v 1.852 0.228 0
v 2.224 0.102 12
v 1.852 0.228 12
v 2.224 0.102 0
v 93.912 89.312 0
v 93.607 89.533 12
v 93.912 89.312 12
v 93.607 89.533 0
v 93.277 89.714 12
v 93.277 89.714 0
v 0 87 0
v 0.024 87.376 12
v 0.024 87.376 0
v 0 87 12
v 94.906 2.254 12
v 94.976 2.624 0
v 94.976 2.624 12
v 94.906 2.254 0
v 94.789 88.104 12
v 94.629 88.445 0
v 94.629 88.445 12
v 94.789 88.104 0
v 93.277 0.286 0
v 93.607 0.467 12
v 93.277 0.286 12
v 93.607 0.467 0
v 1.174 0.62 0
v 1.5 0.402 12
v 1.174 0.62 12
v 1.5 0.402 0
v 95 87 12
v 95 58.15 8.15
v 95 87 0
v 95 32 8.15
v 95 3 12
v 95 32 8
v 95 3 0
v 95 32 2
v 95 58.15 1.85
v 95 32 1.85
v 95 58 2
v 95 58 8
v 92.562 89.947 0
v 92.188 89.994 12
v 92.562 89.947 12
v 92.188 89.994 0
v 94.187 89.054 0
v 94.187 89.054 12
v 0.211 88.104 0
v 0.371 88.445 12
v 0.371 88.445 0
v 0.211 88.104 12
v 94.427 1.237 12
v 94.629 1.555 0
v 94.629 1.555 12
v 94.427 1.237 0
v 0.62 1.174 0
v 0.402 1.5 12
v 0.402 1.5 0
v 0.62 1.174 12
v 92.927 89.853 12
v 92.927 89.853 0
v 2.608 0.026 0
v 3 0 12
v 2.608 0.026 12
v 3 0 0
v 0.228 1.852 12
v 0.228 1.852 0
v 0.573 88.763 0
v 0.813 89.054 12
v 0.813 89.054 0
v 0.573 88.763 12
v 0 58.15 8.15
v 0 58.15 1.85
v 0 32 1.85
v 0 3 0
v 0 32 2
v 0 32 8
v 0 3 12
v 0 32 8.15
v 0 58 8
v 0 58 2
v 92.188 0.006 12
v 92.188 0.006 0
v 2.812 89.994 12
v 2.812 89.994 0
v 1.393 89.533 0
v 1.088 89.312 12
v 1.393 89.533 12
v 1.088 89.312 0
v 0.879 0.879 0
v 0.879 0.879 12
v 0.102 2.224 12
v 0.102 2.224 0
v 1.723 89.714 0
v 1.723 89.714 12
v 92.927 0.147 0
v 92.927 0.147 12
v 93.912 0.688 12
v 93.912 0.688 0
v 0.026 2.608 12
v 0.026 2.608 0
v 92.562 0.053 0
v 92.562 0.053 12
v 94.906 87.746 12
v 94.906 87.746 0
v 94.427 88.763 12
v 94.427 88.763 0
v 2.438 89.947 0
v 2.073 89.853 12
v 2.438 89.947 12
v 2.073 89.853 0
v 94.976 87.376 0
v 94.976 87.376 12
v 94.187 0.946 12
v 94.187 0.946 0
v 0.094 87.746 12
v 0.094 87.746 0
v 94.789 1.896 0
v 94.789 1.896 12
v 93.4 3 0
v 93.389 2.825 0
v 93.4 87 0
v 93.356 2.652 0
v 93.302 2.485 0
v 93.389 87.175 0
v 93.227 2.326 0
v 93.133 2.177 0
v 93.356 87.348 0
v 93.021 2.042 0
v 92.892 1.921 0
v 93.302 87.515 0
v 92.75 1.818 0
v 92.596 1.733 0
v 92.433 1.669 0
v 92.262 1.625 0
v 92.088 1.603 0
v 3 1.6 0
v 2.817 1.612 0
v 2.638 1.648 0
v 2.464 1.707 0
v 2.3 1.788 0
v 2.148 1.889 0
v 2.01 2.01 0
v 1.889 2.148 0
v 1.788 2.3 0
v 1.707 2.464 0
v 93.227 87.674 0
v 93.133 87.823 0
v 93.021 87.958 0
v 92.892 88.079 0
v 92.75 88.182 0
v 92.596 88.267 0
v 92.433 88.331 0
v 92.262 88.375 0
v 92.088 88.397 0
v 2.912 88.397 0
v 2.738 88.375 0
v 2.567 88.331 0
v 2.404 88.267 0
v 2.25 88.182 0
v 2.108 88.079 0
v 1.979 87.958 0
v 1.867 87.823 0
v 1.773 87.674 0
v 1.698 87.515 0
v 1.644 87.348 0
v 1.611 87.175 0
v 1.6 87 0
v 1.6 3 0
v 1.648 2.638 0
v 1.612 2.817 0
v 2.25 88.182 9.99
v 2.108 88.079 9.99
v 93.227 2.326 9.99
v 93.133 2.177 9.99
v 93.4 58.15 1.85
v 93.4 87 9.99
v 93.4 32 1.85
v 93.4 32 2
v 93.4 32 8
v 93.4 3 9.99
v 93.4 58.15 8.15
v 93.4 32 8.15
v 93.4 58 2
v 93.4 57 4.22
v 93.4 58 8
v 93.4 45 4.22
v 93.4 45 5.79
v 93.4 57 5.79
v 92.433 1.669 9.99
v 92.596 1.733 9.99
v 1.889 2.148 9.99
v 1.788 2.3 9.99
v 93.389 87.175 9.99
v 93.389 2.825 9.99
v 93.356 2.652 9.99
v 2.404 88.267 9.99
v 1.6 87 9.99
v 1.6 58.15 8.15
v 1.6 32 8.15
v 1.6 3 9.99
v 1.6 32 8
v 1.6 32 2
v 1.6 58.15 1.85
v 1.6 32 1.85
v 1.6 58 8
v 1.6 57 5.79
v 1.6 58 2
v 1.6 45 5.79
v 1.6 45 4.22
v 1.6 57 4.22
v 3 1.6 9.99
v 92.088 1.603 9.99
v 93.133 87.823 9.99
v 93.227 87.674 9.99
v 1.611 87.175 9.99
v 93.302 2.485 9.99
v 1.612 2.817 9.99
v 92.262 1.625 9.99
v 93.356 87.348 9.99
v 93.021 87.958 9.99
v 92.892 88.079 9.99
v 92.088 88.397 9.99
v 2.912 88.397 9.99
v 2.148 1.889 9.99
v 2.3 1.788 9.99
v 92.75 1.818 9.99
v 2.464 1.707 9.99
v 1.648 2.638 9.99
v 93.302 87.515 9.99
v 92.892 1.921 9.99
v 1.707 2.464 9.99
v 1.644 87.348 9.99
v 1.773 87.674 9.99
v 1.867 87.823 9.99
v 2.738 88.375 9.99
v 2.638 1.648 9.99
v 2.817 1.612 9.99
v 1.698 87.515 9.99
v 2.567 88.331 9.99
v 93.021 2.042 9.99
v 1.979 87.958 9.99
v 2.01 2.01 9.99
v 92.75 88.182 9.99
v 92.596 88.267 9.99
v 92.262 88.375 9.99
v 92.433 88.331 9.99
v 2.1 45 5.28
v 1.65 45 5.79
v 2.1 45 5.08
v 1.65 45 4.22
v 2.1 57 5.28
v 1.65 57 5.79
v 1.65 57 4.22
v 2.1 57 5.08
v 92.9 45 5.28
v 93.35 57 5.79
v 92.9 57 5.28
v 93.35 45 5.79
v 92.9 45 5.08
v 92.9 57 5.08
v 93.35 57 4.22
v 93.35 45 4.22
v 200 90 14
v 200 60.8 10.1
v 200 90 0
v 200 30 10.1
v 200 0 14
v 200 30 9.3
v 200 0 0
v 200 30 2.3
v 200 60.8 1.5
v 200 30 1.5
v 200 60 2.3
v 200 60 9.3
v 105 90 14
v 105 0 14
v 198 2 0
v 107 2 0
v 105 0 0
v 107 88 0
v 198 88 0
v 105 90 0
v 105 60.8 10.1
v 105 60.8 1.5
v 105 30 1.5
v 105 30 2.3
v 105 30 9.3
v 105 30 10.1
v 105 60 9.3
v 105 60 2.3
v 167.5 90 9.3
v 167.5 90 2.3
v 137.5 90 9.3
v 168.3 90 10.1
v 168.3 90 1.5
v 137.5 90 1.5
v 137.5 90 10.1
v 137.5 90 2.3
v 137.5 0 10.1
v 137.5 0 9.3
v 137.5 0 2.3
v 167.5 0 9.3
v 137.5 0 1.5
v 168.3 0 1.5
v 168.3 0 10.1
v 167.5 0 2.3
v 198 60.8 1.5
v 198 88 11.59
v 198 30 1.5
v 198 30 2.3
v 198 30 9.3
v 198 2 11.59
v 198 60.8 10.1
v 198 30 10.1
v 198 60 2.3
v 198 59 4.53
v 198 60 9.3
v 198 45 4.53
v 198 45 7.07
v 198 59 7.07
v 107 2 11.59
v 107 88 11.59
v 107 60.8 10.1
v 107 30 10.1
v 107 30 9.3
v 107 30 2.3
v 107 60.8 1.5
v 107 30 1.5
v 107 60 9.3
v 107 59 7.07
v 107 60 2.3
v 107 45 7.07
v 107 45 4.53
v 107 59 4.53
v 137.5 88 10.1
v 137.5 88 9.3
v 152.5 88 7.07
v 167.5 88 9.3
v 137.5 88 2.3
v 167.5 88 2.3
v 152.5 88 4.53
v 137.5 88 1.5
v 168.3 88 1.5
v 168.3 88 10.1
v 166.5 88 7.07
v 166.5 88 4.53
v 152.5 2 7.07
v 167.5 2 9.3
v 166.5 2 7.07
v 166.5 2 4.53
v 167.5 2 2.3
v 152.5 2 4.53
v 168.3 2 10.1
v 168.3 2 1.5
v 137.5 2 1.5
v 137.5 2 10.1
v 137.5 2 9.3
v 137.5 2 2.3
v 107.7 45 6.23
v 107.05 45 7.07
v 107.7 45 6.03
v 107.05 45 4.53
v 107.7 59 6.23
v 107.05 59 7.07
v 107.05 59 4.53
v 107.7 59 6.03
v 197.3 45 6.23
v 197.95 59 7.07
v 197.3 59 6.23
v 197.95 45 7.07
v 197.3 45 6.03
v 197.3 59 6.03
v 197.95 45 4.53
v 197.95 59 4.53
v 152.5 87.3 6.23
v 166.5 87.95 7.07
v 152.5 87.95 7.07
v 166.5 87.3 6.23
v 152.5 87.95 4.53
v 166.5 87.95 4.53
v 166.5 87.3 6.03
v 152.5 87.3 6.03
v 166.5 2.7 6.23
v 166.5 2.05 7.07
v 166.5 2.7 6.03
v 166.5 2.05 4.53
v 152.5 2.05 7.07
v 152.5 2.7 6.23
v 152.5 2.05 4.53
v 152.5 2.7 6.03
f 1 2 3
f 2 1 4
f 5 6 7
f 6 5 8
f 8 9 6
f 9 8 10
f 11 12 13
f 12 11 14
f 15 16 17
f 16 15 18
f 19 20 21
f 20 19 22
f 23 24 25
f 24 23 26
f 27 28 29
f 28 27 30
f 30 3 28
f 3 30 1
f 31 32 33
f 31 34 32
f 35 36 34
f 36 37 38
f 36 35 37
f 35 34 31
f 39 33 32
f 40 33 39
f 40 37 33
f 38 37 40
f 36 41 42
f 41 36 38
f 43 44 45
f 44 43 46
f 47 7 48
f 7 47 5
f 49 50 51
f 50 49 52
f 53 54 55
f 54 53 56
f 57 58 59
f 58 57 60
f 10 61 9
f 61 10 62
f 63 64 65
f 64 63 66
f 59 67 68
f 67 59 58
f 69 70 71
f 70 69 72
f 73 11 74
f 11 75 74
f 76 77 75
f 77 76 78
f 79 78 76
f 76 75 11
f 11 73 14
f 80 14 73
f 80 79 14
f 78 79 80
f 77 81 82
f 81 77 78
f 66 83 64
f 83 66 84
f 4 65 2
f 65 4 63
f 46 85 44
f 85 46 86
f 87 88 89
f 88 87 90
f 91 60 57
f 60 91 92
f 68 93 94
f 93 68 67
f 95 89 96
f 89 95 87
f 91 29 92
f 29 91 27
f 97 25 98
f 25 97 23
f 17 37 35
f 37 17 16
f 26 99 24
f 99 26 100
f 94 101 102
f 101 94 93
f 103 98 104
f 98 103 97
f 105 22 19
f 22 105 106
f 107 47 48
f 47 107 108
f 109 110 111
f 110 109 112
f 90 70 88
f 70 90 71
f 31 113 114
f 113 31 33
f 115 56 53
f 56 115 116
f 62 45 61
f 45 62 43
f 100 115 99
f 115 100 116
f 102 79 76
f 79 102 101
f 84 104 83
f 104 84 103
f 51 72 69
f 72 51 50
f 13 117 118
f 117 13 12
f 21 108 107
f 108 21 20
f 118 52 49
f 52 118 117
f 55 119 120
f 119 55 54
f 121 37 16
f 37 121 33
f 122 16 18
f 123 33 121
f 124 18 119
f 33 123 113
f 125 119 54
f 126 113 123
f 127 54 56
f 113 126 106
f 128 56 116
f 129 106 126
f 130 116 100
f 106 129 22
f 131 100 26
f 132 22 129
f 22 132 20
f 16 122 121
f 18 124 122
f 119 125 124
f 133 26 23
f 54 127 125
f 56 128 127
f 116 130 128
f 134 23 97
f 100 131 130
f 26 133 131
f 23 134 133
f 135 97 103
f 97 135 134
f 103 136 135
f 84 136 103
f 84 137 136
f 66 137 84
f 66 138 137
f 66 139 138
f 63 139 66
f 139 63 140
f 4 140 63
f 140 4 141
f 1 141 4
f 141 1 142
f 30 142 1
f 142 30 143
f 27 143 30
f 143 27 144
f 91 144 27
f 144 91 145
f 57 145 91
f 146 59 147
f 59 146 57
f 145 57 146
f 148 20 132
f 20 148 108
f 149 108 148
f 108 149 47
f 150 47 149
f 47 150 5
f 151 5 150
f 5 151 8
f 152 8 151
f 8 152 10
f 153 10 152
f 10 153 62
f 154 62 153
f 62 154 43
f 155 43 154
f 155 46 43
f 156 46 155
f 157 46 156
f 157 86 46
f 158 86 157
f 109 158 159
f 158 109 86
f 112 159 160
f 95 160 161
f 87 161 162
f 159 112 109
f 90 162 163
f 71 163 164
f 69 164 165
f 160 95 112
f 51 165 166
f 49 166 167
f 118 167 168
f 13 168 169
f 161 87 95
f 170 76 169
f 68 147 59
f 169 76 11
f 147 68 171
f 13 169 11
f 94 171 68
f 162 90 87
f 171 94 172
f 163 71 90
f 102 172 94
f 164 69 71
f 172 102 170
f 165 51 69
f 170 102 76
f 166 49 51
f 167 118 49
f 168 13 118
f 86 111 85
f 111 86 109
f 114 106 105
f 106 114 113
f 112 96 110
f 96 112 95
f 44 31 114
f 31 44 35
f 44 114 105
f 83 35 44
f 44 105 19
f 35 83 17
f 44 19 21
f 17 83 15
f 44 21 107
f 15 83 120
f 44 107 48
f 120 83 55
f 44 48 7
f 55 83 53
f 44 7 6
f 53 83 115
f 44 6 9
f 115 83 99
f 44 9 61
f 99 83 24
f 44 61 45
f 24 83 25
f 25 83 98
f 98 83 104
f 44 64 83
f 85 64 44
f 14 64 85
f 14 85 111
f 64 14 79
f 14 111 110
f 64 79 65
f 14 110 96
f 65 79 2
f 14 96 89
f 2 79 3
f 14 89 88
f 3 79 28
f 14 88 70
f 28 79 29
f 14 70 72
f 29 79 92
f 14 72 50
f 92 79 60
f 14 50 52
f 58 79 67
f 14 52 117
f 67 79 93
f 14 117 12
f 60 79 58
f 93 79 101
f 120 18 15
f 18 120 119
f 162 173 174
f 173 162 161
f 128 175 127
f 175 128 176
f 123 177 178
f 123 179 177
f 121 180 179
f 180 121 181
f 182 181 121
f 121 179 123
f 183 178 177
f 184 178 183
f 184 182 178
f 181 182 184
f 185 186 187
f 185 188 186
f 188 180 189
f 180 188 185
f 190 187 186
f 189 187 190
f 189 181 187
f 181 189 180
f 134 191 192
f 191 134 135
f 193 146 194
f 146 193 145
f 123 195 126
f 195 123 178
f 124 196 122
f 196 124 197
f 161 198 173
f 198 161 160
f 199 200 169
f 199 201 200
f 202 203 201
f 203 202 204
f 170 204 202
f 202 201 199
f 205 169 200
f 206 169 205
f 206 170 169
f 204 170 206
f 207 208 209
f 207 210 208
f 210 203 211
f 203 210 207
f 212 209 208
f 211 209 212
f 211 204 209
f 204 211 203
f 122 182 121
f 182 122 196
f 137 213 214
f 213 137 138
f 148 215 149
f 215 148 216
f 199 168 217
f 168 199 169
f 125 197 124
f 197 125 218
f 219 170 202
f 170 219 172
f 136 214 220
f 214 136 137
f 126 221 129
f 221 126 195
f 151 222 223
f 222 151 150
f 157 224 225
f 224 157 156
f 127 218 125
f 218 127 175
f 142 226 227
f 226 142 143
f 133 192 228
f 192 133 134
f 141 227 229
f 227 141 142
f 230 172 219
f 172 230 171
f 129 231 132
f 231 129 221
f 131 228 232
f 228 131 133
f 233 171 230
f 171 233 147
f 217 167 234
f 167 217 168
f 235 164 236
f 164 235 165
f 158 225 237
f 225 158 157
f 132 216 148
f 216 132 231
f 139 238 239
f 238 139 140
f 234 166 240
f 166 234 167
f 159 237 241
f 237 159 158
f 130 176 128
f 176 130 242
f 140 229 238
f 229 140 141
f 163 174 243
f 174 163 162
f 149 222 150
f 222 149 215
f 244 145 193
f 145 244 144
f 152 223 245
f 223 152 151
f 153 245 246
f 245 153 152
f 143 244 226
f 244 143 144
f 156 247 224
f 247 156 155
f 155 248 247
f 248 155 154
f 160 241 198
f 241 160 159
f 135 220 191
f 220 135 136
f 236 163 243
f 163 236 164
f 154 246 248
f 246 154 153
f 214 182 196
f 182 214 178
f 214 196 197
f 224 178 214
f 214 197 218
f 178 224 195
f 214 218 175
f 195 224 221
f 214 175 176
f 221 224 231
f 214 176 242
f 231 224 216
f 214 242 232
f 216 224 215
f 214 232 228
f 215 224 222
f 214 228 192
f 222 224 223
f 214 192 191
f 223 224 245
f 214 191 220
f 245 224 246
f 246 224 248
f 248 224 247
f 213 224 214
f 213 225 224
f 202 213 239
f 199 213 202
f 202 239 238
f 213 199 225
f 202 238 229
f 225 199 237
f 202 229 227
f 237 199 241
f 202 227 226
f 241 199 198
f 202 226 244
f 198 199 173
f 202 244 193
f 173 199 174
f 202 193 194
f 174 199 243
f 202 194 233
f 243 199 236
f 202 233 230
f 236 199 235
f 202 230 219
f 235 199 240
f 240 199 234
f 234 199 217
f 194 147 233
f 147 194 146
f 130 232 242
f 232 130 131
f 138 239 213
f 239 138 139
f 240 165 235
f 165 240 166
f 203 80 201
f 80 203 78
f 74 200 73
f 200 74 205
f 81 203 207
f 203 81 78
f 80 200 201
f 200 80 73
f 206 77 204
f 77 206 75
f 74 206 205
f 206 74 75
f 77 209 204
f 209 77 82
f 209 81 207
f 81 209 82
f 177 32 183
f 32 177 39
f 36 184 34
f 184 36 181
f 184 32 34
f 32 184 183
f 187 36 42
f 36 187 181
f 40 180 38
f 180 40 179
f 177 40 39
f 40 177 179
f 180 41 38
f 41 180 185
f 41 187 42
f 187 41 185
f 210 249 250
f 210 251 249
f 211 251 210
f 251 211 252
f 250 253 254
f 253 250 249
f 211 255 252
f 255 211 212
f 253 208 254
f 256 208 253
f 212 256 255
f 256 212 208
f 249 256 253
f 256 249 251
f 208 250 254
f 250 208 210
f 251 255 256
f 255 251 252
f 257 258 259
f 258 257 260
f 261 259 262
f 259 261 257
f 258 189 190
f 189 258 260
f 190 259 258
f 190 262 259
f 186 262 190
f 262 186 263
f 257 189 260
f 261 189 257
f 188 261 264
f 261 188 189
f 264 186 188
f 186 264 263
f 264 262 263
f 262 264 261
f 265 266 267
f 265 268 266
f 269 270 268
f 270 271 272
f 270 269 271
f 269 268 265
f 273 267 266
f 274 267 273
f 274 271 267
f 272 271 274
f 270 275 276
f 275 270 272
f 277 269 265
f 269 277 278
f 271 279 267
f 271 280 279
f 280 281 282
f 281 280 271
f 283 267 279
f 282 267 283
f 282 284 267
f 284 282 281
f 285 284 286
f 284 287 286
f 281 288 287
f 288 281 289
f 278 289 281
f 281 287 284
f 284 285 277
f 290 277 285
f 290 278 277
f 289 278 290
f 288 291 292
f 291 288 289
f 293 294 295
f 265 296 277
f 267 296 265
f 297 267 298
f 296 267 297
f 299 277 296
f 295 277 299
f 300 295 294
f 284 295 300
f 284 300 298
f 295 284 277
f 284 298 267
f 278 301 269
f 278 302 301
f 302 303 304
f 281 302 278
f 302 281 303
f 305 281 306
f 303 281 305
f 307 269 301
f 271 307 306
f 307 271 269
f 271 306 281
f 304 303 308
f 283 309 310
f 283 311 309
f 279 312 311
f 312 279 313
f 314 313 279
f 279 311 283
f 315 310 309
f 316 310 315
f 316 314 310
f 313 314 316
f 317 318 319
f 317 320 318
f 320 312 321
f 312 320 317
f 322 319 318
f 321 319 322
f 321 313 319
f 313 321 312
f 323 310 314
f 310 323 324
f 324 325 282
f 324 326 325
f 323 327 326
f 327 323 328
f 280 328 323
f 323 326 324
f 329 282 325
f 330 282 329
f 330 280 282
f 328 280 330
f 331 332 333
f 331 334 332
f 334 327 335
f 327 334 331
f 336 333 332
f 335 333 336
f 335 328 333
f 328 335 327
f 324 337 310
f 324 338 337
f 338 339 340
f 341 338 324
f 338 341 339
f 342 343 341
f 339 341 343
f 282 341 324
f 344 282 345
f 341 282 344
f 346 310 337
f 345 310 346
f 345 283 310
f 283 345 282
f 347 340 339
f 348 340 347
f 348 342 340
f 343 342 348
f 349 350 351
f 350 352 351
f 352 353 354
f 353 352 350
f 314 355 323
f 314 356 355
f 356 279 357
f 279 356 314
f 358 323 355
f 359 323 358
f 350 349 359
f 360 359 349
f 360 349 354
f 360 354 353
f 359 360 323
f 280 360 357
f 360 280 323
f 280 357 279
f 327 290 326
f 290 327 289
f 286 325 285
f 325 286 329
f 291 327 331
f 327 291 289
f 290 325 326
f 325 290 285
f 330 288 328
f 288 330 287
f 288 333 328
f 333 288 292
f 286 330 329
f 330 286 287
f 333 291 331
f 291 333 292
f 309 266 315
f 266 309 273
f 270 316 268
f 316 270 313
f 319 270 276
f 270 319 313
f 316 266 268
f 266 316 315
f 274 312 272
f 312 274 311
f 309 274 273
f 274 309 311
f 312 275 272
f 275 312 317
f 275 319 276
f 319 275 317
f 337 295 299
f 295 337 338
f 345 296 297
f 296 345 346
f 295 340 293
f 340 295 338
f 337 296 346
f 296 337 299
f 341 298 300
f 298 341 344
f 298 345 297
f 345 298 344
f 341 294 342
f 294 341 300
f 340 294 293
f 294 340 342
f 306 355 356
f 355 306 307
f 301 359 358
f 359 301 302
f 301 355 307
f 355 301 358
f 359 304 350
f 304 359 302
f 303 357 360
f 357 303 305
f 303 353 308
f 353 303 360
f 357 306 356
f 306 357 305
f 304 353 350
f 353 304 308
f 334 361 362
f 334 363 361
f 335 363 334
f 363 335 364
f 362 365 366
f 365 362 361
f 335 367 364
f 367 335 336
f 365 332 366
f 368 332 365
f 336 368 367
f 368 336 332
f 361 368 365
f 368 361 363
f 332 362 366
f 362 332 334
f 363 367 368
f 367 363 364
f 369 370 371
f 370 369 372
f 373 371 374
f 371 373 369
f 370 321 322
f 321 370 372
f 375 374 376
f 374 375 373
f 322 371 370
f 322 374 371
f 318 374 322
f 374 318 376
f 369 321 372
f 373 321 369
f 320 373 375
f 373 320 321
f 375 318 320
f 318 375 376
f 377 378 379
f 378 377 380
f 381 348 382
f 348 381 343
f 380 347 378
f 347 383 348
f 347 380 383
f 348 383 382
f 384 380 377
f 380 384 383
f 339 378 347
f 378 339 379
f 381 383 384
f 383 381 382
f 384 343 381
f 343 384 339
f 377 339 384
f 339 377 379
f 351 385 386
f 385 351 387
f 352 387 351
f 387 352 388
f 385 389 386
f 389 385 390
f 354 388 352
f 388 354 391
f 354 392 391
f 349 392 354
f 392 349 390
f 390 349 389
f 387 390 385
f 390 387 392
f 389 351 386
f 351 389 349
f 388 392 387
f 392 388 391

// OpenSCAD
$fn=48;
translate([0,0,0])
{
union()
{
    difference()
    {
        translate(v = [3.00, 3.00, 0.00])
        {
            hull()
            {
                cylinder(center = false, r1 = 3, r2 = 3, h = 12);
                translate(v = [89.00, 0.00, 0.00])
                {
                    cylinder(center = false, r1 = 3, r2 = 3, h = 12, $fn = 50);
                }
                translate(v = [0.00, 84.00, 0.00])
                {
                    cylinder(center = false, r1 = 3, r2 = 3, h = 12, $fn = 50);
                }
                translate(v = [89.00, 84.00, 0.00])
                {
                    cylinder(center = false, r1 = 3, r2 = 3, h = 12, $fn = 50);
                }
            }
        }
        translate(v = [1.60, 1.60, -0.01])
        {
            translate(v = [1.40, 1.40, 0.00])
            {
                hull()
                {
                    cylinder(center = false, r1 = 1.4, r2 = 1.4, h = 10);
                    translate(v = [89.00, 0.00, 0.00])
                    {
                        cylinder(center = false, r1 = 1.4, r2 = 1.4, h = 10, $fn = 50);
                    }
                    translate(v = [0.00, 84.00, 0.00])
                    {
                        cylinder(center = false, r1 = 1.4, r2 = 1.4, h = 10, $fn = 50);
                    }
                    translate(v = [89.00, 84.00, 0.00])
                    {
                        cylinder(center = false, r1 = 1.4, r2 = 1.4, h = 10, $fn = 50);
                    }
                }
            }
        }
        translate(v = [1.60, 58.15, 0.00])
        {
            rotate([90.00, 0.00, 0.00])
            {
                translate(v = [-1.65, 8.00, 0.00])
                {
                    cube(size = [1.70, 0.15, 26.15], center = false); 
                }
            }
        }
        translate(v = [1.60, 58.15, 0.00])
        {
            rotate([90.00, 0.00, 0.00])
            {
                translate(v = [-1.65, 1.85, 0.00])
                {
                    cube(size = [1.70, 0.15, 26.15], center = false); 
                }
            }
        }
        translate(v = [1.60, 58.15, 0.00])
        {
            rotate([90.00, 0.00, 0.00])
            {
                translate(v = [-1.65, 1.85, 0.00])
                {
                    cube(size = [1.70, 6.30, 0.15], center = false); 
                }
            }
        }
        translate(v = [93.40, 32.00, 0.00])
        {
            rotate([90.00, 0.00, 180.00])
            {
                translate(v = [-1.65, 8.00, 0.00])
                {
                    cube(size = [1.70, 0.15, 26.15], center = false); 
                }
            }
        }
        translate(v = [93.40, 32.00, 0.00])
        {
            rotate([90.00, 0.00, 180.00])
            {
                translate(v = [-1.65, 1.85, 0.00])
                {
                    cube(size = [1.70, 0.15, 26.15], center = false); 
                }
            }
        }
        translate(v = [93.40, 58.00, 0.00])
        {
            rotate([90.00, 0.00, 180.00])
            {
                translate(v = [-1.65, 1.85, 0.00])
                {
                    cube(size = [1.70, 6.30, 0.15], center = false); 
                }
            }
        }
    }
    translate(v = [1.60, 57.00, 0.00])
    {
        rotate([90.00, 0.00, 0.00])
        {
            hull()
            {
                translate(v = [0.00, 4.22, 0.00])
                {
                    cube(size = [0.05, 1.57, 12.00], center = false); 
                }
                translate(v = [0.45, 5.08, 0.00])
                {
                    cube(size = [0.05, 0.20, 12.00], center = false); 
                }
            }
        }
    }
    translate(v = [93.40, 45.00, 0.00])
    {
        rotate([90.00, 0.00, 180.00])
        {
            hull()
            {
                translate(v = [0.00, 4.22, 0.00])
                {
                    cube(size = [0.05, 1.57, 12.00], center = false); 
                }
                translate(v = [0.45, 5.08, 0.00])
                {
                    cube(size = [0.05, 0.20, 12.00], center = false); 
                }
            }
        }
    }
}

}
translate([105,0,0])
{
union()
{
    difference()
    {
        cube(size = [95.00, 90.00, 14.00], center = false); 
        translate(v = [2.00, 2.00, -0.01])
        {
            cube(size = [91.00, 86.00, 11.60], center = false); 
        }
        translate(v = [2.00, 60.80, 0.00])
        {
            rotate([90.00, 0.00, 0.00])
            {
                translate(v = [-2.05, 9.30, 0.00])
                {
                    cube(size = [2.10, 0.80, 30.80], center = false); 
                }
            }
        }
        translate(v = [2.00, 60.80, 0.00])
        {
            rotate([90.00, 0.00, 0.00])
            {
                translate(v = [-2.05, 1.50, 0.00])
                {
                    cube(size = [2.10, 0.80, 30.80], center = false); 
                }
            }
        }
        translate(v = [2.00, 60.80, 0.00])
        {
            rotate([90.00, 0.00, 0.00])
            {
                translate(v = [-2.05, 1.50, 0.00])
                {
                    cube(size = [2.10, 8.60, 0.80], center = false); 
                }
            }
        }
        translate(v = [93.00, 30.00, 0.00])
        {
            rotate([90.00, 0.00, 180.00])
            {
                translate(v = [-2.05, 9.30, 0.00])
                {
                    cube(size = [2.10, 0.80, 30.80], center = false); 
                }
            }
        }
        translate(v = [93.00, 30.00, 0.00])
        {
            rotate([90.00, 0.00, 180.00])
            {
                translate(v = [-2.05, 1.50, 0.00])
                {
                    cube(size = [2.10, 0.80, 30.80], center = false); 
                }
            }
        }
        translate(v = [93.00, 60.00, 0.00])
        {
            rotate([90.00, 0.00, 180.00])
            {
                translate(v = [-2.05, 1.50, 0.00])
                {
                    cube(size = [2.10, 8.60, 0.80], center = false); 
                }
            }
        }
        translate(v = [63.30, 88.00, 0.00])
        {
            rotate([90.00, 0.00, -90.00])
            {
                translate(v = [-2.05, 9.30, 0.00])
                {
                    cube(size = [2.10, 0.80, 30.80], center = false); 
                }
            }
        }
        translate(v = [63.30, 88.00, 0.00])
        {
            rotate([90.00, 0.00, -90.00])
            {
                translate(v = [-2.05, 1.50, 0.00])
                {
                    cube(size = [2.10, 0.80, 30.80], center = false); 
                }
            }
        }
        translate(v = [63.30, 88.00, 0.00])
        {
            rotate([90.00, 0.00, -90.00])
            {
                translate(v = [-2.05, 1.50, 0.00])
                {
                    cube(size = [2.10, 8.60, 0.80], center = false); 
                }
            }
        }
        translate(v = [32.50, 2.00, 0.00])
        {
            rotate([90.00, 0.00, 90.00])
            {
                translate(v = [-2.05, 9.30, 0.00])
                {
                    cube(size = [2.10, 0.80, 30.80], center = false); 
                }
            }
        }
        translate(v = [32.50, 2.00, 0.00])
        {
            rotate([90.00, 0.00, 90.00])
            {
                translate(v = [-2.05, 1.50, 0.00])
                {
                    cube(size = [2.10, 0.80, 30.80], center = false); 
                }
            }
        }
        translate(v = [62.50, 2.00, 0.00])
        {
            rotate([90.00, 0.00, 90.00])
            {
                translate(v = [-2.05, 1.50, 0.00])
                {
                    cube(size = [2.10, 8.60, 0.80], center = false); 
                }
            }
        }
    }
    translate(v = [2.00, 59.00, 0.00])
    {
        rotate([90.00, 0.00, 0.00])
        {
            hull()
            {
                translate(v = [0.00, 4.53, 0.00])
                {
                    cube(size = [0.05, 2.54, 14.00], center = false); 
                }
                translate(v = [0.65, 6.03, 0.00])
                {
                    cube(size = [0.05, 0.20, 14.00], center = false); 
                }
            }
        }
    }
    translate(v = [93.00, 45.00, 0.00])
    {
        rotate([90.00, 0.00, 180.00])
        {
            hull()
            {
                translate(v = [0.00, 4.53, 0.00])
                {
                    cube(size = [0.05, 2.54, 14.00], center = false); 
                }
                translate(v = [0.65, 6.03, 0.00])
                {
                    cube(size = [0.05, 0.20, 14.00], center = false); 
                }
            }
        }
    }
    translate(v = [61.50, 88.00, 0.00])
    {
        rotate([90.00, 0.00, -90.00])
        {
            hull()
            {
                translate(v = [0.00, 4.53, 0.00])
                {
                    cube(size = [0.05, 2.54, 14.00], center = false); 
                }
                translate(v = [0.65, 6.03, 0.00])
                {
                    cube(size = [0.05, 0.20, 14.00], center = false); 
                }
            }
        }
    }
    translate(v = [47.50, 2.00, 0.00])
    {
        rotate([90.00, 0.00, 90.00])
        {
            hull()
            {
                translate(v = [0.00, 4.53, 0.00])
                {
                    cube(size = [0.05, 2.54, 14.00], center = false); 
                }
                translate(v = [0.65, 6.03, 0.00])
                {
                    cube(size = [0.05, 0.20, 14.00], center = false); 
                }
            }
        }
    }
}

}
